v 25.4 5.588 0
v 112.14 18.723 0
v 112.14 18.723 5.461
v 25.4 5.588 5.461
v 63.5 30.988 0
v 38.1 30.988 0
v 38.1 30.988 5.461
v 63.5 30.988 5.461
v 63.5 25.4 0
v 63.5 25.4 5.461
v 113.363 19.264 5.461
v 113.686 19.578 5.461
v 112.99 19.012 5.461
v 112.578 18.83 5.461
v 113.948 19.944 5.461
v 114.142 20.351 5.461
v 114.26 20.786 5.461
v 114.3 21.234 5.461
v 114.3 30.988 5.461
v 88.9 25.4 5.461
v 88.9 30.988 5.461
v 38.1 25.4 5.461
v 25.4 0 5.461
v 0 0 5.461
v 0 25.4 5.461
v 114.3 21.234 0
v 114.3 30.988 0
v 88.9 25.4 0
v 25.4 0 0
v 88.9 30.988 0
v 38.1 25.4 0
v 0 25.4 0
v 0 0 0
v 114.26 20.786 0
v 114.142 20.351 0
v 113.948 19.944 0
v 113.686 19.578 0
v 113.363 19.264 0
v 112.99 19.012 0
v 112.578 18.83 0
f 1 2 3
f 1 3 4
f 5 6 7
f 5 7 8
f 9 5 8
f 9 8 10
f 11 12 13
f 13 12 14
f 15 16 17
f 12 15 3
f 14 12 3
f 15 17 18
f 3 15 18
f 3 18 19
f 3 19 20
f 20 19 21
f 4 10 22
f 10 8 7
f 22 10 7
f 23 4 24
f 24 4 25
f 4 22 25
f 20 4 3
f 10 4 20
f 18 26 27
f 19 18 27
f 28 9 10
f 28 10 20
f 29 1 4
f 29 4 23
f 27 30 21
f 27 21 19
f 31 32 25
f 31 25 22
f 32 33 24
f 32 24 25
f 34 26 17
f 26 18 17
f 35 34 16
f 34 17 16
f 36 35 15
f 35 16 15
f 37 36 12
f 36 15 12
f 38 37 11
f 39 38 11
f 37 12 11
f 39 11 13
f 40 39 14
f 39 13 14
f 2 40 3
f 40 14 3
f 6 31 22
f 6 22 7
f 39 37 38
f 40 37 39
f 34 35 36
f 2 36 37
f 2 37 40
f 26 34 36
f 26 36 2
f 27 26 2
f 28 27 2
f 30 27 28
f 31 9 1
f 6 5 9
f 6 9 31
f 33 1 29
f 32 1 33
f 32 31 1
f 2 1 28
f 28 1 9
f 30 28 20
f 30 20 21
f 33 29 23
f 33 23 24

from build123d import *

# Parameters (mm, degrees)
BOSS_EXTRUDE1_DEPTH = 5.461
FILLET1_R           = 2.54


with BuildPart() as part:
    # Sketch1 → Boss-Extrude1 (new body)
    with BuildSketch(Plane.XY):
        Polygon((0, 0), (0, 25.4), (38.1, 25.4), (38.1, 30.988), (63.5, 30.988), (63.5, 25.4), (88.9, 25.4), (88.9, 30.988), (114.3, 30.988), (114.3, 25.4), (114.3, 19.05), (25.4, 5.588), (25.4, 0), align=None)
    extrude(amount=BOSS_EXTRUDE1_DEPTH)

    # Fillet1
    fillet1_edges = [part.edges().sort_by_distance(p)[0] for p in [
        (114.3, 19.05, 2.7305),
    ]]
    fillet(fillet1_edges, radius=FILLET1_R)


solid = part.part
